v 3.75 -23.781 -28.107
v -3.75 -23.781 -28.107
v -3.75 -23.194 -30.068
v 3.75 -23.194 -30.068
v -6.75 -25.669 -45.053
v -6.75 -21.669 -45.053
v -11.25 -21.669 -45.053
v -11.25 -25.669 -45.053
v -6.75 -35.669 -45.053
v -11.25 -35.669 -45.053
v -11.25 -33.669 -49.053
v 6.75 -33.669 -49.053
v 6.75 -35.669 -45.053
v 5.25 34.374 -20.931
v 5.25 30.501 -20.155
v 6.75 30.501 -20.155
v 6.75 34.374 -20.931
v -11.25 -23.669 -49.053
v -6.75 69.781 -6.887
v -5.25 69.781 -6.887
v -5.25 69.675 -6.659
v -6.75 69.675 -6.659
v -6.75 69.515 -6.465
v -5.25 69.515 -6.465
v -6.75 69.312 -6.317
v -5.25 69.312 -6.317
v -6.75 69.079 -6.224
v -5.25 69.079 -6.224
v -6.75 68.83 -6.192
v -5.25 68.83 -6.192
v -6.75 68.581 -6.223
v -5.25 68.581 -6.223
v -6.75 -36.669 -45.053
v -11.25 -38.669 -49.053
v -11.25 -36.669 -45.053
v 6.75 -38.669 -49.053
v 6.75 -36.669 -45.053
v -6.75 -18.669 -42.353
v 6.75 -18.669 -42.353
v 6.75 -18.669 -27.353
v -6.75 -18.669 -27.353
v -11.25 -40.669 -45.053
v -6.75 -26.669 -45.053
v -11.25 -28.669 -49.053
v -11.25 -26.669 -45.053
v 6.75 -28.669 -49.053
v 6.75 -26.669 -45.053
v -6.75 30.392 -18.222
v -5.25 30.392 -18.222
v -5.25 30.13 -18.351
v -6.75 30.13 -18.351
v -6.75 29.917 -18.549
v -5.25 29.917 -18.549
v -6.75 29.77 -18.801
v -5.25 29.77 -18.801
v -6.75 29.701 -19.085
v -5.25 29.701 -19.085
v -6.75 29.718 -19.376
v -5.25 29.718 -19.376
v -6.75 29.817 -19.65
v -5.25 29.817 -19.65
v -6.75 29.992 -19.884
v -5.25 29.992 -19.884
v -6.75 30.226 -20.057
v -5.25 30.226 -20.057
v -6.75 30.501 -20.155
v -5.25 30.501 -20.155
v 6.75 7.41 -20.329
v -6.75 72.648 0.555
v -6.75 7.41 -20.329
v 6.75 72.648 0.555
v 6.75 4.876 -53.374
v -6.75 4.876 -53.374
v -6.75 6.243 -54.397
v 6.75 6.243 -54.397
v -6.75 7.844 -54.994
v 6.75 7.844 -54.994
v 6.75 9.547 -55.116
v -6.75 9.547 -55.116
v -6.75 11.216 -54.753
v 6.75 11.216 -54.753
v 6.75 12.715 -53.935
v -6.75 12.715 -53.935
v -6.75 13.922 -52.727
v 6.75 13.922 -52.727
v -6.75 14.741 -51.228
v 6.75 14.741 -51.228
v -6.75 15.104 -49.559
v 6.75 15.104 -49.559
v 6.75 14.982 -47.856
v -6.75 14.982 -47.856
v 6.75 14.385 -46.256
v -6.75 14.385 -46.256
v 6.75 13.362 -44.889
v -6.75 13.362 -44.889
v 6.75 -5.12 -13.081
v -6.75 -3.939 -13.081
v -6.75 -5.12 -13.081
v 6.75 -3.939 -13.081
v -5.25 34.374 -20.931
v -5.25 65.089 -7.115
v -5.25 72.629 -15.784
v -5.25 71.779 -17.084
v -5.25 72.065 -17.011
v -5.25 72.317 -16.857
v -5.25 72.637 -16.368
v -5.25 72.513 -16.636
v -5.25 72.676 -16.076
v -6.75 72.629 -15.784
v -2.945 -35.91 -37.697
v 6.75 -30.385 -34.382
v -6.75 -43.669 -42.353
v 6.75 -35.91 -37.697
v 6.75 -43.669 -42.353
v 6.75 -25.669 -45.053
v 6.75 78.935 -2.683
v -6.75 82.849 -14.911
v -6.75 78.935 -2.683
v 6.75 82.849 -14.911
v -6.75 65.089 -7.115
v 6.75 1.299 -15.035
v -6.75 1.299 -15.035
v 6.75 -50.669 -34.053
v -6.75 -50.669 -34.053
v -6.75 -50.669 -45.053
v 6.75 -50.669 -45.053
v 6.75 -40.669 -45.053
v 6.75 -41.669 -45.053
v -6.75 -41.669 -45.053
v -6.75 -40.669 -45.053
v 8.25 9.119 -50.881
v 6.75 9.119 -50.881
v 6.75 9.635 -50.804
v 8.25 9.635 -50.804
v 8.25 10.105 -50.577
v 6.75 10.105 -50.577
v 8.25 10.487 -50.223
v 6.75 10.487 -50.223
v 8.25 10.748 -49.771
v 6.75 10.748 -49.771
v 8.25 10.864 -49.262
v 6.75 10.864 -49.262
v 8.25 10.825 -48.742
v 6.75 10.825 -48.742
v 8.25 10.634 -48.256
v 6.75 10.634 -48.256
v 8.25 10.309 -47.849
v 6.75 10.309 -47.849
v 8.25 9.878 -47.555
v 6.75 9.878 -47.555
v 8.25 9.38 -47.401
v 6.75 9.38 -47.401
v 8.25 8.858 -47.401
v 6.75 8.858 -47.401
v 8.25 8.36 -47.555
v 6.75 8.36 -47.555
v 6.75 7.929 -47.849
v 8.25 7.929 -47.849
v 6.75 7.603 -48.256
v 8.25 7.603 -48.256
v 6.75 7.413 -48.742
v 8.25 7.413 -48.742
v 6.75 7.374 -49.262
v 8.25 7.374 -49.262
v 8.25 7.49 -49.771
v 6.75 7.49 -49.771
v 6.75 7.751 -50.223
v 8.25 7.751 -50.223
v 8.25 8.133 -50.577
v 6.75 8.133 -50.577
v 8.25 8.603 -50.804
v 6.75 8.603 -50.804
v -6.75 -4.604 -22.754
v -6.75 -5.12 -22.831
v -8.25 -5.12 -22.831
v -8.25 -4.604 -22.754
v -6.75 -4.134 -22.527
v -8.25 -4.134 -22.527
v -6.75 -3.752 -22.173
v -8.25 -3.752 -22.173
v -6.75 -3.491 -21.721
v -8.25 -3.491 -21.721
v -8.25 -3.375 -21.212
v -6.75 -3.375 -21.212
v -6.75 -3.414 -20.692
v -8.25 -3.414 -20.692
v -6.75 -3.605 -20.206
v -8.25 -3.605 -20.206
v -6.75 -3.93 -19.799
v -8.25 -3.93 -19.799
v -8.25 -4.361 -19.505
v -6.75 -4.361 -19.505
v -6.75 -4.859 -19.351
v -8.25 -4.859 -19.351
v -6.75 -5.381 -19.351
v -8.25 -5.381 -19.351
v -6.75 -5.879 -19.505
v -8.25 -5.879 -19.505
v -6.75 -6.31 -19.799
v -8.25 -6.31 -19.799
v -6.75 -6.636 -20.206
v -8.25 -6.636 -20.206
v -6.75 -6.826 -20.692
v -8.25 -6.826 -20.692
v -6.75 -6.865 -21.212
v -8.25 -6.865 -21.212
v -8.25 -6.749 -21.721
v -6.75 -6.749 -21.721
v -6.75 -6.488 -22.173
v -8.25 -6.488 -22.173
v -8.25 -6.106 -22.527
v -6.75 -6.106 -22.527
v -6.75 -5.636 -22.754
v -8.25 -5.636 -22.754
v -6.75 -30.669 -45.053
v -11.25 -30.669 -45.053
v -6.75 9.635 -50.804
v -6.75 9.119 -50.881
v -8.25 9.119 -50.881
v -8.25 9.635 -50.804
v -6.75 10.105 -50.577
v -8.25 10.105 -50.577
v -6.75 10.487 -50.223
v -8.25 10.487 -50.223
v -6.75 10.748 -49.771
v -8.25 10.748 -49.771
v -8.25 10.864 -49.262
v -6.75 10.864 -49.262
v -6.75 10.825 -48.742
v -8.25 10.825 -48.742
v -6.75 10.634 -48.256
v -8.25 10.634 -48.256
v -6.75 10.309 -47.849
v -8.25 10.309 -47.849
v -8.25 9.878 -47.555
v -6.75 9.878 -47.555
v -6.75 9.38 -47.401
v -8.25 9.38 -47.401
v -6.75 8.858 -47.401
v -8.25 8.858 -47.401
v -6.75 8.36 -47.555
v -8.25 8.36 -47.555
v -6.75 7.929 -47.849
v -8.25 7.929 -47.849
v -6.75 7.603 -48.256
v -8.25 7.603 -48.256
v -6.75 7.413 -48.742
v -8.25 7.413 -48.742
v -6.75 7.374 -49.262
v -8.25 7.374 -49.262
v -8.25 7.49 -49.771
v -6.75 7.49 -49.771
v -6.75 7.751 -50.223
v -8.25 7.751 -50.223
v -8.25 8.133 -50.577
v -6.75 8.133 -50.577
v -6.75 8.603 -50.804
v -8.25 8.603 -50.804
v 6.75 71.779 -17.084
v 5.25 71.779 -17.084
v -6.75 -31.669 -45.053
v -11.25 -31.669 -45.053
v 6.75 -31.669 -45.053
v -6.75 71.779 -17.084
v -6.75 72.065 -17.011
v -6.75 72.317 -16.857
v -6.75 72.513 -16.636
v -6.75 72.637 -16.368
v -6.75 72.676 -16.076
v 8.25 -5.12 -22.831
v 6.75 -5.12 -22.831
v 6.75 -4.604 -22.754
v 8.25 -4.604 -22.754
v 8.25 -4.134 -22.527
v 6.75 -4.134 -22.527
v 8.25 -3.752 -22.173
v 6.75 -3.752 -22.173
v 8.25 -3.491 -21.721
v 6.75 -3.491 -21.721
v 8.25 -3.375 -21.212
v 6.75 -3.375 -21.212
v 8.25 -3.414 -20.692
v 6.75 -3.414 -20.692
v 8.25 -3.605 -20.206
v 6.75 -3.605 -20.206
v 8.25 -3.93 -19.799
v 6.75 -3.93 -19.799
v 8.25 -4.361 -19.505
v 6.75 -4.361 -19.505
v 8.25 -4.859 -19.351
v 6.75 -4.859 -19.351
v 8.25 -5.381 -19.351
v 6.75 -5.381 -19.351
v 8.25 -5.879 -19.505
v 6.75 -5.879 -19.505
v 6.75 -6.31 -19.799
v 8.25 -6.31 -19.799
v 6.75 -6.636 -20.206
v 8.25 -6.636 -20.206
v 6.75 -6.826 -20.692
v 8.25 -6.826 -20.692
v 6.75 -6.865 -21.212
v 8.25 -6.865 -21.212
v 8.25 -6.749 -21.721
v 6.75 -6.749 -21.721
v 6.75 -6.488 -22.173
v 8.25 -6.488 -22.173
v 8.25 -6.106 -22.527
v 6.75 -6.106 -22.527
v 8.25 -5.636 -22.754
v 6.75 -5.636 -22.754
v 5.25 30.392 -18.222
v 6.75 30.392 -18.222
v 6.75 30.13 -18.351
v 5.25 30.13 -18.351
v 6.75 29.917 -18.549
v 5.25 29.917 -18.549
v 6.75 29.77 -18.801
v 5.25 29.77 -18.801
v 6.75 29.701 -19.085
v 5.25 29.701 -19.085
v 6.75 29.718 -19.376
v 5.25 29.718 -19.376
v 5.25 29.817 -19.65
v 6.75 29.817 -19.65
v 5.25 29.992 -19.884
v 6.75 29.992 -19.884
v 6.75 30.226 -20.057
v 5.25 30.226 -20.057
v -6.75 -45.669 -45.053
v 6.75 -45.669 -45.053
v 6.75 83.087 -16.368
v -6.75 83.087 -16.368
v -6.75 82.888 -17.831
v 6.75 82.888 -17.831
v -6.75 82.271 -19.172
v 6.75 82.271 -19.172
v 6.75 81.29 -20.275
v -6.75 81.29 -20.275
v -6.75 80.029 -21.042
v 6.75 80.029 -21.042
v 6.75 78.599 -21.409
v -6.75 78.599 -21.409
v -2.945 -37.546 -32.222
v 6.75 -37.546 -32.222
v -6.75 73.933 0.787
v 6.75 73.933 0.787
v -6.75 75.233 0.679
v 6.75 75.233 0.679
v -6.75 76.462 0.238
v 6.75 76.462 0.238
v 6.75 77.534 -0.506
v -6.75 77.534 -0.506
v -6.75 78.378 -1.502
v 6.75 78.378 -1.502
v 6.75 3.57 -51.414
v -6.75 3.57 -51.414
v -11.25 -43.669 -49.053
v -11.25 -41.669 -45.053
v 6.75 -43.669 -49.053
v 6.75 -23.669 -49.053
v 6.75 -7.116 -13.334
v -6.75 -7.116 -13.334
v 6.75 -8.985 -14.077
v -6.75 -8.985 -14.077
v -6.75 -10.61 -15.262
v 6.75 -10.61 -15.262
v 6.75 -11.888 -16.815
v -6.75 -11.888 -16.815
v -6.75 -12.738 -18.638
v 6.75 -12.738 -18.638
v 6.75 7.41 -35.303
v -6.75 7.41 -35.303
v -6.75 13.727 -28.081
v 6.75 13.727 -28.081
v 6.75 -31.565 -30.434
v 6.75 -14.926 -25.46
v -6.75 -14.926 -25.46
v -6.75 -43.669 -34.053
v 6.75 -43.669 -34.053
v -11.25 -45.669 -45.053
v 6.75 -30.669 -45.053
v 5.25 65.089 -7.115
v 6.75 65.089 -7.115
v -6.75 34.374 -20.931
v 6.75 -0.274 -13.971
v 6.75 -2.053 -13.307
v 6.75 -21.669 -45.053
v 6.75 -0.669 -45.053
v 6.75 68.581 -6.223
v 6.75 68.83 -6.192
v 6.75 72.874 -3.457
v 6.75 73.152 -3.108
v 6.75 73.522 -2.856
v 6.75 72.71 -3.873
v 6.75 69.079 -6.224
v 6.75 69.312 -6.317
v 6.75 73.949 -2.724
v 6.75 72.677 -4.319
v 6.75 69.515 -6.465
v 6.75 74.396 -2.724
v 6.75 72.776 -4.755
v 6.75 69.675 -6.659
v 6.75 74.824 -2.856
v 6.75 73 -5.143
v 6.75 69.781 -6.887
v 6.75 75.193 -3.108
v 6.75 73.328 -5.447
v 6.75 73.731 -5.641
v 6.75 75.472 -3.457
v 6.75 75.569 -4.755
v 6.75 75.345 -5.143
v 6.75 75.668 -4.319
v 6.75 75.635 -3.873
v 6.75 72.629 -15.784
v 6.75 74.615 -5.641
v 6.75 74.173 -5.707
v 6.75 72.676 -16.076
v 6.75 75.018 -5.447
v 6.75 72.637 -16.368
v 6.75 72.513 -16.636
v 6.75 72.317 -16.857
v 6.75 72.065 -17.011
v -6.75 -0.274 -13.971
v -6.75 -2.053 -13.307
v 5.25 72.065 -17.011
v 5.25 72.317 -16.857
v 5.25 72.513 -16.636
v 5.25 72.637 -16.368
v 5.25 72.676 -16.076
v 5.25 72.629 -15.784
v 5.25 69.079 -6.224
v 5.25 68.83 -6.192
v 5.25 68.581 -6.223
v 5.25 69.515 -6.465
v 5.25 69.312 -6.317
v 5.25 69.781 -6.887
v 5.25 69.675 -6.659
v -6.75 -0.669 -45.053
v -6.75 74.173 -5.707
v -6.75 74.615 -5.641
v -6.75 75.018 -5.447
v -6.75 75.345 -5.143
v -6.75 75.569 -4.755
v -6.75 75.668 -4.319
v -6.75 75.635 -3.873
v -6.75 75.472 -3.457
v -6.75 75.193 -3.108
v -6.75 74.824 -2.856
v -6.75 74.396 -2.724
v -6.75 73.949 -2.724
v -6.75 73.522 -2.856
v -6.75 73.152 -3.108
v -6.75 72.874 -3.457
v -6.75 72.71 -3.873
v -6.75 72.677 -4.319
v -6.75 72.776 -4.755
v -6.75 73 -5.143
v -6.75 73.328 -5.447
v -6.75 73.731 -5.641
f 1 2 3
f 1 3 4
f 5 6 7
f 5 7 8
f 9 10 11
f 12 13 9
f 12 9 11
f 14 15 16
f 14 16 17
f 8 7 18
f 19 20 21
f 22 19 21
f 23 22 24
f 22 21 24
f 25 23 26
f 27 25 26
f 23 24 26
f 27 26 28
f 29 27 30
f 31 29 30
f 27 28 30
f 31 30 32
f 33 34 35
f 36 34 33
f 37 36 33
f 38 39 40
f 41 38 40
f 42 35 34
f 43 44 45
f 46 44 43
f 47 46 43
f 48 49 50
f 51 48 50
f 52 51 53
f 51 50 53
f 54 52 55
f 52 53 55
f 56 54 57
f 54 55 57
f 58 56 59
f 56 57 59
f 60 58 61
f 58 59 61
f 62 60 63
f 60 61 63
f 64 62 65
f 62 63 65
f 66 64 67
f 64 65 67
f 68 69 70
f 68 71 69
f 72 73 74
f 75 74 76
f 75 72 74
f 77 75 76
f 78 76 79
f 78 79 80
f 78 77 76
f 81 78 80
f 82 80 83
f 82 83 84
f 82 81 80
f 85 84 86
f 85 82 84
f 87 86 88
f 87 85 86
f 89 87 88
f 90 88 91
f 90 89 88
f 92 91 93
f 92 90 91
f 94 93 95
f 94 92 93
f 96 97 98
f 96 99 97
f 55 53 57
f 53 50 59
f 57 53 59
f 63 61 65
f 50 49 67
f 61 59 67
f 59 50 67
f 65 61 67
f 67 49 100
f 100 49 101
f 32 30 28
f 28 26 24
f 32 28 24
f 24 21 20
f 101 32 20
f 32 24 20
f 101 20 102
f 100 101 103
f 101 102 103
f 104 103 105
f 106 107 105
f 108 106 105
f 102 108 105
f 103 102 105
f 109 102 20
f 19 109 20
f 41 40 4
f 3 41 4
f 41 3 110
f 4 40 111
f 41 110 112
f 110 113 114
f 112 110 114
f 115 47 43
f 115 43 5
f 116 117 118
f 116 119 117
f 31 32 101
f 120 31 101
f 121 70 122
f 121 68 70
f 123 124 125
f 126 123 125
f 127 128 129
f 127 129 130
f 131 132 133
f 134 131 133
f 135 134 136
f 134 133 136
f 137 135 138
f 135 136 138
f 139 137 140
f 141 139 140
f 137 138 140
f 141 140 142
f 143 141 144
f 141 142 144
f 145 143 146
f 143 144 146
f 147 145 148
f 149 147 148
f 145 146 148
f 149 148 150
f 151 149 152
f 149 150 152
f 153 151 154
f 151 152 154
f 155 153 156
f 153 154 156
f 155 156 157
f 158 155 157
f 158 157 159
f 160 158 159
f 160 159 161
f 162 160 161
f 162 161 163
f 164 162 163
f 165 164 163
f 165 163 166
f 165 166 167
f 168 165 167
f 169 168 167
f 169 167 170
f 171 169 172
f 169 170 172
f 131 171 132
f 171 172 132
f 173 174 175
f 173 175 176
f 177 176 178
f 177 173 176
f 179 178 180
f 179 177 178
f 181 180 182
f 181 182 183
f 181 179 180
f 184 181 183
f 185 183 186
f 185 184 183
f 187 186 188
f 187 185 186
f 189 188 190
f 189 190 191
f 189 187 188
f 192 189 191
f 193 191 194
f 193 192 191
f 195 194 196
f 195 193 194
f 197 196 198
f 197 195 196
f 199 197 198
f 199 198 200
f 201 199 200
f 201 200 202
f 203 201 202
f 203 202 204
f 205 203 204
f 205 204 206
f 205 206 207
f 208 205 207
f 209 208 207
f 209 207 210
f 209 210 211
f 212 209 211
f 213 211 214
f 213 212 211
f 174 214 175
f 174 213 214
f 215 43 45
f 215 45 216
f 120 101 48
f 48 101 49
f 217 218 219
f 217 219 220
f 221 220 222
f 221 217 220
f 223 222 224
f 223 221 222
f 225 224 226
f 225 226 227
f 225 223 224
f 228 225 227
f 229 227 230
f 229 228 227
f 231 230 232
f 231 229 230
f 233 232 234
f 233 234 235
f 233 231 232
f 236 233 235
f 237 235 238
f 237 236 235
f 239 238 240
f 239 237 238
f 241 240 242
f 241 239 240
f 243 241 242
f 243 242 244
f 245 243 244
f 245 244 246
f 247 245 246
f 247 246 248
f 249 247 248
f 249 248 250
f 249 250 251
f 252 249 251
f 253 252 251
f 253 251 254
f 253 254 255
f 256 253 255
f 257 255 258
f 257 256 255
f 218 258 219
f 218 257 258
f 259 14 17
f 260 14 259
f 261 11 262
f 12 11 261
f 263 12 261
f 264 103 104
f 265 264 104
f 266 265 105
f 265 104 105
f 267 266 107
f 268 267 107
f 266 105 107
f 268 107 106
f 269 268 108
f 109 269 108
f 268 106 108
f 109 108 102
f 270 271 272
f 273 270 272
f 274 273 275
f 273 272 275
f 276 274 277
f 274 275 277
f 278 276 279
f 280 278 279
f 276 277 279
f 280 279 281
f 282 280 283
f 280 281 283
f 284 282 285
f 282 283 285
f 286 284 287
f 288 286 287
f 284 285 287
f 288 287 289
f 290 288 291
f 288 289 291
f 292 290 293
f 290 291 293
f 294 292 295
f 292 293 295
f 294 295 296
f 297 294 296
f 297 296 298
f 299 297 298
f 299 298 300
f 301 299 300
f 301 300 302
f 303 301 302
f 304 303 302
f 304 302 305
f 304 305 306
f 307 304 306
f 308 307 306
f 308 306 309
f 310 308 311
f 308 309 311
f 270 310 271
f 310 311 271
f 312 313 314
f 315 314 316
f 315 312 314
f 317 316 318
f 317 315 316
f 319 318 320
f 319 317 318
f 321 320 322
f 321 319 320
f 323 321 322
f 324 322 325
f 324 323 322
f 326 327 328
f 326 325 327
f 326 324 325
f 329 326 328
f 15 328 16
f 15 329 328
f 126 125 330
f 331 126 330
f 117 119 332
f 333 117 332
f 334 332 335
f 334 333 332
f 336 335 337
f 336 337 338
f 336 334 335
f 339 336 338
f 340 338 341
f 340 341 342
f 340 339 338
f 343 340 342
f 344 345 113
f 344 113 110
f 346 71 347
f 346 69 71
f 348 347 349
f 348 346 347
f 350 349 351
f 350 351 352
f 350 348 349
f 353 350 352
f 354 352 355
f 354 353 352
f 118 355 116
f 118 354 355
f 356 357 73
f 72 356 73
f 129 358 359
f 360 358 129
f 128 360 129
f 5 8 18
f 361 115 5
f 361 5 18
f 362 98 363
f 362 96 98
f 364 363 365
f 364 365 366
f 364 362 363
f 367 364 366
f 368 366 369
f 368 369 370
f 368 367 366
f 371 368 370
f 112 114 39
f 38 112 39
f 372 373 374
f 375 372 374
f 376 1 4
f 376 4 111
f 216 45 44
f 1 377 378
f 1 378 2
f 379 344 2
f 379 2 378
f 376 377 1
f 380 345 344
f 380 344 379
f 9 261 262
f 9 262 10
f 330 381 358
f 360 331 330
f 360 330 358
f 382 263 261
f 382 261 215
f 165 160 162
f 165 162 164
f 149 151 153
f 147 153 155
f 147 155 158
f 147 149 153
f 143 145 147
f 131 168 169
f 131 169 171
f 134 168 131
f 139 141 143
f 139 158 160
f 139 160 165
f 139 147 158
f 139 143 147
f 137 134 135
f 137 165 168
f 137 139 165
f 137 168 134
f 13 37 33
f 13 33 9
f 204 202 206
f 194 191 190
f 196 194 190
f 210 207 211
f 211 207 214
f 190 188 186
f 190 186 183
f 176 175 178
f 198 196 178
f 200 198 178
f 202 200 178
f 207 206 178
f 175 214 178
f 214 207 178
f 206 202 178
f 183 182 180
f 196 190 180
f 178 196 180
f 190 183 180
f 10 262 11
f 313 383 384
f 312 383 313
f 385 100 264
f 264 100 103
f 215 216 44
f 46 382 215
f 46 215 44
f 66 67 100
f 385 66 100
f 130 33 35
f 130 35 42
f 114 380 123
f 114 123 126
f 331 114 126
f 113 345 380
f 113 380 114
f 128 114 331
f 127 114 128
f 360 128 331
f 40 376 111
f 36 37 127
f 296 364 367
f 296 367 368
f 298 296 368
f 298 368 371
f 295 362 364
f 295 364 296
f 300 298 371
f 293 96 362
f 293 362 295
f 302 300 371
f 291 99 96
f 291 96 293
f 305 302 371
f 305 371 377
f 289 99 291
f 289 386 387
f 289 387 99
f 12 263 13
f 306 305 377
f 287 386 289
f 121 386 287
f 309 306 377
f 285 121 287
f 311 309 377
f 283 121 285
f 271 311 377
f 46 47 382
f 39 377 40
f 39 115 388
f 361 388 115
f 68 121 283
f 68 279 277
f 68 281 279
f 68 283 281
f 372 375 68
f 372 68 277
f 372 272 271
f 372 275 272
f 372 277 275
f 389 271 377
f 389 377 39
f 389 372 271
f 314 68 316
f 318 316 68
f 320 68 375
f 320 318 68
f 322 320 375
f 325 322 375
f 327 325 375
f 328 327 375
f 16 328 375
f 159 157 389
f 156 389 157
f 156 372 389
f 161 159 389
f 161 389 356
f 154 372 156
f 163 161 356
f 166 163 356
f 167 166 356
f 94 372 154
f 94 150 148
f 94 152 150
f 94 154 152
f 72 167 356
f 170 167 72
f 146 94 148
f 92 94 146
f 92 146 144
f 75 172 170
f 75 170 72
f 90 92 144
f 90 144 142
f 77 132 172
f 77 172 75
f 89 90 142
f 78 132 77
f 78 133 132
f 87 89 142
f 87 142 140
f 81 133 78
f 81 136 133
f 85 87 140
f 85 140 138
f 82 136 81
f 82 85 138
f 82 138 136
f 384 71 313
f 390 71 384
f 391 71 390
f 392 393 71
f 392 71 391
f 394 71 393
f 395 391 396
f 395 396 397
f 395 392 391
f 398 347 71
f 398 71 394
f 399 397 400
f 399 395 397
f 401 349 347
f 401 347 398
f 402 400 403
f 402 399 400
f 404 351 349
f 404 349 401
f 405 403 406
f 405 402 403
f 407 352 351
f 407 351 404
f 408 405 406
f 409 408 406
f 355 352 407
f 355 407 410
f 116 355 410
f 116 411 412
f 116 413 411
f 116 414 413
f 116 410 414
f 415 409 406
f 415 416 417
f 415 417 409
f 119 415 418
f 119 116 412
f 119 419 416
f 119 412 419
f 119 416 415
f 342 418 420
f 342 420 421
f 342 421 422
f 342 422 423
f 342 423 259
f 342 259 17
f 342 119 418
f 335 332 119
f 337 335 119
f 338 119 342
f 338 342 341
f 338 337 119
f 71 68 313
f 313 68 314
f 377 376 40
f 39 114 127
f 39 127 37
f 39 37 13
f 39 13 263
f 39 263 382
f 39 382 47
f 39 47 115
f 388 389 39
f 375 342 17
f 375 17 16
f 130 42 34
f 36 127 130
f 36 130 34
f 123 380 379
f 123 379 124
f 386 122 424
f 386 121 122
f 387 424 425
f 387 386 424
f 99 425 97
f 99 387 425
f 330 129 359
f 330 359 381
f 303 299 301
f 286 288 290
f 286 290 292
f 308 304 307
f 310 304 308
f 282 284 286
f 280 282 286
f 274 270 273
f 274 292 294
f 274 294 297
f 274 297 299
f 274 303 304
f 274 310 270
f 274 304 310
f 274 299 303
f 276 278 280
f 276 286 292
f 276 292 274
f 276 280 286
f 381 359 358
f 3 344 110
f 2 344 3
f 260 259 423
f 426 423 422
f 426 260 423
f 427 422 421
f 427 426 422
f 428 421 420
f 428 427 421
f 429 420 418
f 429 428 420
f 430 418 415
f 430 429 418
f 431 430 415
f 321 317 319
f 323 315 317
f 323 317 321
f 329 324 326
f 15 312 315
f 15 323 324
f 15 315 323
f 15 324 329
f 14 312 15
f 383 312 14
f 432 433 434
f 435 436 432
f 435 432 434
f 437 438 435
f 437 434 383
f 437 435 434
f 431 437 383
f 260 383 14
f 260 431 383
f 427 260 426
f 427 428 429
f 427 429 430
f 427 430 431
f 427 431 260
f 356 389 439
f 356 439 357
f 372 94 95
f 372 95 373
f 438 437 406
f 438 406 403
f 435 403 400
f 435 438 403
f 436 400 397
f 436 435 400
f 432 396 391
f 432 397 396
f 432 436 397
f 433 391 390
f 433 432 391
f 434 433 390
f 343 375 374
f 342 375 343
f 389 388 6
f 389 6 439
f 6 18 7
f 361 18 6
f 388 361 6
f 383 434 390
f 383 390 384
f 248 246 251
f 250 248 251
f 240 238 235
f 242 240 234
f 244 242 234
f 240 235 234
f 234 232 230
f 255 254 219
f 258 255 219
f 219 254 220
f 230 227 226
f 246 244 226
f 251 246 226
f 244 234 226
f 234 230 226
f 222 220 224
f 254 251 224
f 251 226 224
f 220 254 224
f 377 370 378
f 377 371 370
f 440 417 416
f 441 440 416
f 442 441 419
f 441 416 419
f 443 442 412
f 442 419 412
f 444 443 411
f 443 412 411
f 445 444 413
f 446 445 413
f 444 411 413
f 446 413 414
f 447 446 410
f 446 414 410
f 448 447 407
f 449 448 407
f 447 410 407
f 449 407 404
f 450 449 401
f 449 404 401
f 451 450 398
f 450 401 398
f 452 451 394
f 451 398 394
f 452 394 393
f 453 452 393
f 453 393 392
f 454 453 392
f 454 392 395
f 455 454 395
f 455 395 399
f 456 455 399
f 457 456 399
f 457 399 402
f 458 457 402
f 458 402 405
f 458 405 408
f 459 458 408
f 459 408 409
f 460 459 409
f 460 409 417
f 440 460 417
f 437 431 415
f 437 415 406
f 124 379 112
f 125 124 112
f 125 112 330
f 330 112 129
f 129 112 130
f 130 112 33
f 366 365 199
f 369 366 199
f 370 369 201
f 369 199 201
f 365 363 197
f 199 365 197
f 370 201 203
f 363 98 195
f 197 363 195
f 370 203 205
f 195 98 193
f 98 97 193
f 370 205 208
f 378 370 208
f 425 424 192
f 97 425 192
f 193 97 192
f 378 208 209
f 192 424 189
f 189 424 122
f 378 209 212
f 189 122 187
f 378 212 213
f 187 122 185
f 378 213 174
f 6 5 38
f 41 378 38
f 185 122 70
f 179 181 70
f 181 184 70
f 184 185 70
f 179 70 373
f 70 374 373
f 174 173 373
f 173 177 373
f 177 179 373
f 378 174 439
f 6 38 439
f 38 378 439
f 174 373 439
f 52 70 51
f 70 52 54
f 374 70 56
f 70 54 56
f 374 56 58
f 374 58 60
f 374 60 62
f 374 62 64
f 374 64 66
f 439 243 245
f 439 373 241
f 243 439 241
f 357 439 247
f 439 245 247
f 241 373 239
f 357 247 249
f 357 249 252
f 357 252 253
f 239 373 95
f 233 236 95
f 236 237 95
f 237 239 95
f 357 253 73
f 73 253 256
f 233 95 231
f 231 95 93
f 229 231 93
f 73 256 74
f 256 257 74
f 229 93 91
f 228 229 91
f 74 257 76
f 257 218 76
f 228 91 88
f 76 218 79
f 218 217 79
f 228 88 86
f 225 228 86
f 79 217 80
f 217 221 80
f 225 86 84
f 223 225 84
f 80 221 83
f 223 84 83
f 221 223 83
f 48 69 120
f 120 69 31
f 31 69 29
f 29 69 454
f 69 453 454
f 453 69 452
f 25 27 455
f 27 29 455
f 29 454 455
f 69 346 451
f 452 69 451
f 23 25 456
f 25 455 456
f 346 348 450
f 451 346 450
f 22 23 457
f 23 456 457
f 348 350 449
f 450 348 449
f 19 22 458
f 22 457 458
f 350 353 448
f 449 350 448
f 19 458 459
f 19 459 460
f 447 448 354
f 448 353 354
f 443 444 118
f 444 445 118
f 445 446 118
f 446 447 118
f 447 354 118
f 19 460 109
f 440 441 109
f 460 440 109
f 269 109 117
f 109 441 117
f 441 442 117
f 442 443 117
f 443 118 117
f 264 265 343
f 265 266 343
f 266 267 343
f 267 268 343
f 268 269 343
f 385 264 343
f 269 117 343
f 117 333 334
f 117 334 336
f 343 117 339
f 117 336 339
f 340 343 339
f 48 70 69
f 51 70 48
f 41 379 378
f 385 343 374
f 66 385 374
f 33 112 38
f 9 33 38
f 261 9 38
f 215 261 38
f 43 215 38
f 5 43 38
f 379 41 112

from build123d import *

# Parameters (mm, degrees)
BOSS_EXTRUDE2_DEPTH = 6.75
CUT_EXTRUDE1_DEPTH  = 102.982599985
BOSS_EXTRUDE3_DEPTH = 18
LPATTERN1_COUNT     = 5
LPATTERN1_PITCH     = 5
FILLET1_R           = 8
FILLET2_R           = 5
SKETCH6_R           = 1.5
CUT_EXTRUDE2_DEPTH  = 102.325844179
CUT_EXTRUDE4_DEPTH  = 8
SKETCH9_R           = 1.75
BOSS_EXTRUDE4_DEPTH = 1.5
SKETCH10_R          = 1.75
BOSS_EXTRUDE5_DEPTH = 1.5
CUT_EXTRUDE6_START  = -1.5
CUT_EXTRUDE6_DEPTH  = 103.825844179


with BuildPart() as part:
    # Sketch2 → Boss-Extrude2 (new, symmetric)
    with BuildSketch(Plane(origin=(0, 0, 0), x_dir=(0, 0, -1), z_dir=(1, 0, 0))):
        with BuildLine():
            Line((-2.079082888, 77.410237912), (20.329453697, 7.410237912))
            Line((20.329453697, 7.410237912), (13.081464201, -0.95554047))
            Line((13.081464201, -0.95554047), (13.081464201, -10.95554047))
            Line((13.081464201, -10.95554047), (25.46023991, -14.926171648))
            Line((25.46023991, -14.926171648), (34.052646544, -43.669354287))
            Line((34.052646544, -43.669354287), (34.052646544, -50.669354287))
            Line((34.052646544, -50.669354287), (45.052646544, -50.669354287))
            Line((45.052646544, -50.669354287), (45.052646544, -0.669354287))
            Line((45.052646544, -0.669354287), (51.414117074, 3.570151924))
            Line((51.414117074, 3.570151924), (53.374039372, 4.876312617))
            ThreePointArc((53.374039372, 4.876312617), (53.374039372, 13.361593991), (44.888757997, 13.361593991))
            Line((44.888757997, 13.361593991), (35.302946487, 7.410237912))
            Line((35.302946487, 7.410237912), (28.081464201, 13.727383878))
            Line((28.081464201, 13.727383878), (20.778287365, 84.727383878))
            Line((20.778287365, 84.727383878), (-2.079082888, 77.410237912))
        make_face()
    extrude(amount=BOSS_EXTRUDE2_DEPTH, both=True)

    # Sketch4 → Cut-Extrude1 (cut, through all)
    with BuildSketch(Plane(origin=(6.75, 0, 0), x_dir=(0, 0, -1), z_dir=(1, 0, 0))):
        Polygon((42.352646544, -43.669354287), (42.352646544, -18.669354287), (27.352646544, -18.669354287), align=None)
    extrude(amount=-CUT_EXTRUDE1_DEPTH, mode=Mode.SUBTRACT)

    # Sketch5 → Boss-Extrude3 (add)
    with BuildSketch(Plane(origin=(6.75, 0, 0), x_dir=(0, 0, -1), z_dir=(1, 0, 0))):
        Polygon((49.052646544, -43.669354287), (45.052646544, -41.669354287), (45.052646544, -43.669354287), align=None)
        Polygon((49.052646544, -43.669354287), (45.052646544, -43.669354287), (45.052646544, -45.669354287), align=None)
    boss_extrude3 = extrude(amount=-BOSS_EXTRUDE3_DEPTH)

    # LPattern1: Boss-Extrude3 ×5
    with Locations(*[(0, i * LPATTERN1_PITCH, 0) for i in range(1, LPATTERN1_COUNT)]):
        add(boss_extrude3)

    # Fillet1
    fillet1_edges = [part.edges().sort_by_distance(p)[0] for p in [
        (0, -10.95554047, -13.081464201),
        (0, -0.95554047, -13.081464201),
    ]]
    fillet(fillet1_edges, radius=FILLET1_R)

    # Fillet2
    fillet2_edges = [part.edges().sort_by_distance(p)[0] for p in [
        (0, 77.410237912, 2.079082888),
        (0, 84.727383878, -20.778287365),
    ]]
    fillet(fillet2_edges, radius=FILLET2_R)

    # Sketch6 → Cut-Extrude2 (cut, through all)
    with BuildSketch(Plane(origin=(6.75, 0, 0), x_dir=(0, 0, -1), z_dir=(1, 0, 0))):
        with Locations((4.207274657, 74.172691185)):
            Circle(SKETCH6_R)
    extrude(amount=-CUT_EXTRUDE2_DEPTH, mode=Mode.SUBTRACT)

    # Sketch8 → Cut-Extrude4 (cut)
    with BuildSketch(Plane(origin=(0, 5.762226271, -19.275708093), x_dir=(1, 0, 0), z_dir=(0, -0.28641355449068423, 0.9581060879693918))):
        Polygon((-3.75, -30.834539791), (3.75, -30.834539791), (9.054771206, -45.201974161), (-2.945228794, -45.201974161), align=None)
    extrude(amount=-CUT_EXTRUDE4_DEPTH, mode=Mode.SUBTRACT)

    # Sketch9 → Boss-Extrude4 (add)
    with BuildSketch(Plane(origin=(6.75, 0, 0), x_dir=(0, 0, -1), z_dir=(1, 0, 0))):
        with Locations((49.131398685, 9.118953304)):
            Circle(SKETCH9_R)
    boss_extrude4 = extrude(amount=BOSS_EXTRUDE4_DEPTH)

    # Sketch10 → Boss-Extrude5 (add)
    with BuildSketch(Plane(origin=(6.75, 0, 0), x_dir=(0, 0, -1), z_dir=(1, 0, 0))):
        with Locations((21.081464201, -5.120153169)):
            Circle(SKETCH10_R)
    boss_extrude5 = extrude(amount=BOSS_EXTRUDE5_DEPTH)

    # Sketch11 → Cut-Extrude6 (cut)
    with BuildSketch(Plane(origin=(6.75, 0, 0), x_dir=(0, 0, -1), z_dir=(1, 0, 0)).offset(CUT_EXTRUDE6_START)):
        with BuildLine():
            Line((15.78419602, 72.628770071), (6.886860744, 69.780537742))
            ThreePointArc((6.886860744, 69.780537742), (6.316756639, 69.312297005), (6.22287904, 68.580549047))
            Line((6.22287904, 68.580549047), (7.115164558, 65.08899702))
            Line((7.115164558, 65.08899702), (18.222367047, 30.392212101))
            ThreePointArc((18.222367047, 30.392212101), (19.230775138, 29.698663405), (20.155274557, 30.50065935))
            Line((20.155274557, 30.50065935), (20.931307176, 34.374295724))
            Line((20.931307176, 34.374295724), (17.083828456, 71.778701405))
            ThreePointArc((17.083828456, 71.778701405), (16.636465842, 72.51325811), (15.78419602, 72.628770071))
        make_face()
    cut_extrude6 = extrude(amount=CUT_EXTRUDE6_DEPTH, mode=Mode.SUBTRACT)

    # Mirror1: Boss-Extrude4, Boss-Extrude5, Cut-Extrude6 across plane
    add(boss_extrude4.mirror(Plane(origin=(0, 0, 0), x_dir=(0, 0, 1), z_dir=(1, 0, 0))))
    add(boss_extrude5.mirror(Plane(origin=(0, 0, 0), x_dir=(0, 0, 1), z_dir=(1, 0, 0))))
    add(cut_extrude6.mirror(Plane(origin=(0, 0, 0), x_dir=(0, 0, 1), z_dir=(1, 0, 0))), mode=Mode.SUBTRACT)


solid = part.part
